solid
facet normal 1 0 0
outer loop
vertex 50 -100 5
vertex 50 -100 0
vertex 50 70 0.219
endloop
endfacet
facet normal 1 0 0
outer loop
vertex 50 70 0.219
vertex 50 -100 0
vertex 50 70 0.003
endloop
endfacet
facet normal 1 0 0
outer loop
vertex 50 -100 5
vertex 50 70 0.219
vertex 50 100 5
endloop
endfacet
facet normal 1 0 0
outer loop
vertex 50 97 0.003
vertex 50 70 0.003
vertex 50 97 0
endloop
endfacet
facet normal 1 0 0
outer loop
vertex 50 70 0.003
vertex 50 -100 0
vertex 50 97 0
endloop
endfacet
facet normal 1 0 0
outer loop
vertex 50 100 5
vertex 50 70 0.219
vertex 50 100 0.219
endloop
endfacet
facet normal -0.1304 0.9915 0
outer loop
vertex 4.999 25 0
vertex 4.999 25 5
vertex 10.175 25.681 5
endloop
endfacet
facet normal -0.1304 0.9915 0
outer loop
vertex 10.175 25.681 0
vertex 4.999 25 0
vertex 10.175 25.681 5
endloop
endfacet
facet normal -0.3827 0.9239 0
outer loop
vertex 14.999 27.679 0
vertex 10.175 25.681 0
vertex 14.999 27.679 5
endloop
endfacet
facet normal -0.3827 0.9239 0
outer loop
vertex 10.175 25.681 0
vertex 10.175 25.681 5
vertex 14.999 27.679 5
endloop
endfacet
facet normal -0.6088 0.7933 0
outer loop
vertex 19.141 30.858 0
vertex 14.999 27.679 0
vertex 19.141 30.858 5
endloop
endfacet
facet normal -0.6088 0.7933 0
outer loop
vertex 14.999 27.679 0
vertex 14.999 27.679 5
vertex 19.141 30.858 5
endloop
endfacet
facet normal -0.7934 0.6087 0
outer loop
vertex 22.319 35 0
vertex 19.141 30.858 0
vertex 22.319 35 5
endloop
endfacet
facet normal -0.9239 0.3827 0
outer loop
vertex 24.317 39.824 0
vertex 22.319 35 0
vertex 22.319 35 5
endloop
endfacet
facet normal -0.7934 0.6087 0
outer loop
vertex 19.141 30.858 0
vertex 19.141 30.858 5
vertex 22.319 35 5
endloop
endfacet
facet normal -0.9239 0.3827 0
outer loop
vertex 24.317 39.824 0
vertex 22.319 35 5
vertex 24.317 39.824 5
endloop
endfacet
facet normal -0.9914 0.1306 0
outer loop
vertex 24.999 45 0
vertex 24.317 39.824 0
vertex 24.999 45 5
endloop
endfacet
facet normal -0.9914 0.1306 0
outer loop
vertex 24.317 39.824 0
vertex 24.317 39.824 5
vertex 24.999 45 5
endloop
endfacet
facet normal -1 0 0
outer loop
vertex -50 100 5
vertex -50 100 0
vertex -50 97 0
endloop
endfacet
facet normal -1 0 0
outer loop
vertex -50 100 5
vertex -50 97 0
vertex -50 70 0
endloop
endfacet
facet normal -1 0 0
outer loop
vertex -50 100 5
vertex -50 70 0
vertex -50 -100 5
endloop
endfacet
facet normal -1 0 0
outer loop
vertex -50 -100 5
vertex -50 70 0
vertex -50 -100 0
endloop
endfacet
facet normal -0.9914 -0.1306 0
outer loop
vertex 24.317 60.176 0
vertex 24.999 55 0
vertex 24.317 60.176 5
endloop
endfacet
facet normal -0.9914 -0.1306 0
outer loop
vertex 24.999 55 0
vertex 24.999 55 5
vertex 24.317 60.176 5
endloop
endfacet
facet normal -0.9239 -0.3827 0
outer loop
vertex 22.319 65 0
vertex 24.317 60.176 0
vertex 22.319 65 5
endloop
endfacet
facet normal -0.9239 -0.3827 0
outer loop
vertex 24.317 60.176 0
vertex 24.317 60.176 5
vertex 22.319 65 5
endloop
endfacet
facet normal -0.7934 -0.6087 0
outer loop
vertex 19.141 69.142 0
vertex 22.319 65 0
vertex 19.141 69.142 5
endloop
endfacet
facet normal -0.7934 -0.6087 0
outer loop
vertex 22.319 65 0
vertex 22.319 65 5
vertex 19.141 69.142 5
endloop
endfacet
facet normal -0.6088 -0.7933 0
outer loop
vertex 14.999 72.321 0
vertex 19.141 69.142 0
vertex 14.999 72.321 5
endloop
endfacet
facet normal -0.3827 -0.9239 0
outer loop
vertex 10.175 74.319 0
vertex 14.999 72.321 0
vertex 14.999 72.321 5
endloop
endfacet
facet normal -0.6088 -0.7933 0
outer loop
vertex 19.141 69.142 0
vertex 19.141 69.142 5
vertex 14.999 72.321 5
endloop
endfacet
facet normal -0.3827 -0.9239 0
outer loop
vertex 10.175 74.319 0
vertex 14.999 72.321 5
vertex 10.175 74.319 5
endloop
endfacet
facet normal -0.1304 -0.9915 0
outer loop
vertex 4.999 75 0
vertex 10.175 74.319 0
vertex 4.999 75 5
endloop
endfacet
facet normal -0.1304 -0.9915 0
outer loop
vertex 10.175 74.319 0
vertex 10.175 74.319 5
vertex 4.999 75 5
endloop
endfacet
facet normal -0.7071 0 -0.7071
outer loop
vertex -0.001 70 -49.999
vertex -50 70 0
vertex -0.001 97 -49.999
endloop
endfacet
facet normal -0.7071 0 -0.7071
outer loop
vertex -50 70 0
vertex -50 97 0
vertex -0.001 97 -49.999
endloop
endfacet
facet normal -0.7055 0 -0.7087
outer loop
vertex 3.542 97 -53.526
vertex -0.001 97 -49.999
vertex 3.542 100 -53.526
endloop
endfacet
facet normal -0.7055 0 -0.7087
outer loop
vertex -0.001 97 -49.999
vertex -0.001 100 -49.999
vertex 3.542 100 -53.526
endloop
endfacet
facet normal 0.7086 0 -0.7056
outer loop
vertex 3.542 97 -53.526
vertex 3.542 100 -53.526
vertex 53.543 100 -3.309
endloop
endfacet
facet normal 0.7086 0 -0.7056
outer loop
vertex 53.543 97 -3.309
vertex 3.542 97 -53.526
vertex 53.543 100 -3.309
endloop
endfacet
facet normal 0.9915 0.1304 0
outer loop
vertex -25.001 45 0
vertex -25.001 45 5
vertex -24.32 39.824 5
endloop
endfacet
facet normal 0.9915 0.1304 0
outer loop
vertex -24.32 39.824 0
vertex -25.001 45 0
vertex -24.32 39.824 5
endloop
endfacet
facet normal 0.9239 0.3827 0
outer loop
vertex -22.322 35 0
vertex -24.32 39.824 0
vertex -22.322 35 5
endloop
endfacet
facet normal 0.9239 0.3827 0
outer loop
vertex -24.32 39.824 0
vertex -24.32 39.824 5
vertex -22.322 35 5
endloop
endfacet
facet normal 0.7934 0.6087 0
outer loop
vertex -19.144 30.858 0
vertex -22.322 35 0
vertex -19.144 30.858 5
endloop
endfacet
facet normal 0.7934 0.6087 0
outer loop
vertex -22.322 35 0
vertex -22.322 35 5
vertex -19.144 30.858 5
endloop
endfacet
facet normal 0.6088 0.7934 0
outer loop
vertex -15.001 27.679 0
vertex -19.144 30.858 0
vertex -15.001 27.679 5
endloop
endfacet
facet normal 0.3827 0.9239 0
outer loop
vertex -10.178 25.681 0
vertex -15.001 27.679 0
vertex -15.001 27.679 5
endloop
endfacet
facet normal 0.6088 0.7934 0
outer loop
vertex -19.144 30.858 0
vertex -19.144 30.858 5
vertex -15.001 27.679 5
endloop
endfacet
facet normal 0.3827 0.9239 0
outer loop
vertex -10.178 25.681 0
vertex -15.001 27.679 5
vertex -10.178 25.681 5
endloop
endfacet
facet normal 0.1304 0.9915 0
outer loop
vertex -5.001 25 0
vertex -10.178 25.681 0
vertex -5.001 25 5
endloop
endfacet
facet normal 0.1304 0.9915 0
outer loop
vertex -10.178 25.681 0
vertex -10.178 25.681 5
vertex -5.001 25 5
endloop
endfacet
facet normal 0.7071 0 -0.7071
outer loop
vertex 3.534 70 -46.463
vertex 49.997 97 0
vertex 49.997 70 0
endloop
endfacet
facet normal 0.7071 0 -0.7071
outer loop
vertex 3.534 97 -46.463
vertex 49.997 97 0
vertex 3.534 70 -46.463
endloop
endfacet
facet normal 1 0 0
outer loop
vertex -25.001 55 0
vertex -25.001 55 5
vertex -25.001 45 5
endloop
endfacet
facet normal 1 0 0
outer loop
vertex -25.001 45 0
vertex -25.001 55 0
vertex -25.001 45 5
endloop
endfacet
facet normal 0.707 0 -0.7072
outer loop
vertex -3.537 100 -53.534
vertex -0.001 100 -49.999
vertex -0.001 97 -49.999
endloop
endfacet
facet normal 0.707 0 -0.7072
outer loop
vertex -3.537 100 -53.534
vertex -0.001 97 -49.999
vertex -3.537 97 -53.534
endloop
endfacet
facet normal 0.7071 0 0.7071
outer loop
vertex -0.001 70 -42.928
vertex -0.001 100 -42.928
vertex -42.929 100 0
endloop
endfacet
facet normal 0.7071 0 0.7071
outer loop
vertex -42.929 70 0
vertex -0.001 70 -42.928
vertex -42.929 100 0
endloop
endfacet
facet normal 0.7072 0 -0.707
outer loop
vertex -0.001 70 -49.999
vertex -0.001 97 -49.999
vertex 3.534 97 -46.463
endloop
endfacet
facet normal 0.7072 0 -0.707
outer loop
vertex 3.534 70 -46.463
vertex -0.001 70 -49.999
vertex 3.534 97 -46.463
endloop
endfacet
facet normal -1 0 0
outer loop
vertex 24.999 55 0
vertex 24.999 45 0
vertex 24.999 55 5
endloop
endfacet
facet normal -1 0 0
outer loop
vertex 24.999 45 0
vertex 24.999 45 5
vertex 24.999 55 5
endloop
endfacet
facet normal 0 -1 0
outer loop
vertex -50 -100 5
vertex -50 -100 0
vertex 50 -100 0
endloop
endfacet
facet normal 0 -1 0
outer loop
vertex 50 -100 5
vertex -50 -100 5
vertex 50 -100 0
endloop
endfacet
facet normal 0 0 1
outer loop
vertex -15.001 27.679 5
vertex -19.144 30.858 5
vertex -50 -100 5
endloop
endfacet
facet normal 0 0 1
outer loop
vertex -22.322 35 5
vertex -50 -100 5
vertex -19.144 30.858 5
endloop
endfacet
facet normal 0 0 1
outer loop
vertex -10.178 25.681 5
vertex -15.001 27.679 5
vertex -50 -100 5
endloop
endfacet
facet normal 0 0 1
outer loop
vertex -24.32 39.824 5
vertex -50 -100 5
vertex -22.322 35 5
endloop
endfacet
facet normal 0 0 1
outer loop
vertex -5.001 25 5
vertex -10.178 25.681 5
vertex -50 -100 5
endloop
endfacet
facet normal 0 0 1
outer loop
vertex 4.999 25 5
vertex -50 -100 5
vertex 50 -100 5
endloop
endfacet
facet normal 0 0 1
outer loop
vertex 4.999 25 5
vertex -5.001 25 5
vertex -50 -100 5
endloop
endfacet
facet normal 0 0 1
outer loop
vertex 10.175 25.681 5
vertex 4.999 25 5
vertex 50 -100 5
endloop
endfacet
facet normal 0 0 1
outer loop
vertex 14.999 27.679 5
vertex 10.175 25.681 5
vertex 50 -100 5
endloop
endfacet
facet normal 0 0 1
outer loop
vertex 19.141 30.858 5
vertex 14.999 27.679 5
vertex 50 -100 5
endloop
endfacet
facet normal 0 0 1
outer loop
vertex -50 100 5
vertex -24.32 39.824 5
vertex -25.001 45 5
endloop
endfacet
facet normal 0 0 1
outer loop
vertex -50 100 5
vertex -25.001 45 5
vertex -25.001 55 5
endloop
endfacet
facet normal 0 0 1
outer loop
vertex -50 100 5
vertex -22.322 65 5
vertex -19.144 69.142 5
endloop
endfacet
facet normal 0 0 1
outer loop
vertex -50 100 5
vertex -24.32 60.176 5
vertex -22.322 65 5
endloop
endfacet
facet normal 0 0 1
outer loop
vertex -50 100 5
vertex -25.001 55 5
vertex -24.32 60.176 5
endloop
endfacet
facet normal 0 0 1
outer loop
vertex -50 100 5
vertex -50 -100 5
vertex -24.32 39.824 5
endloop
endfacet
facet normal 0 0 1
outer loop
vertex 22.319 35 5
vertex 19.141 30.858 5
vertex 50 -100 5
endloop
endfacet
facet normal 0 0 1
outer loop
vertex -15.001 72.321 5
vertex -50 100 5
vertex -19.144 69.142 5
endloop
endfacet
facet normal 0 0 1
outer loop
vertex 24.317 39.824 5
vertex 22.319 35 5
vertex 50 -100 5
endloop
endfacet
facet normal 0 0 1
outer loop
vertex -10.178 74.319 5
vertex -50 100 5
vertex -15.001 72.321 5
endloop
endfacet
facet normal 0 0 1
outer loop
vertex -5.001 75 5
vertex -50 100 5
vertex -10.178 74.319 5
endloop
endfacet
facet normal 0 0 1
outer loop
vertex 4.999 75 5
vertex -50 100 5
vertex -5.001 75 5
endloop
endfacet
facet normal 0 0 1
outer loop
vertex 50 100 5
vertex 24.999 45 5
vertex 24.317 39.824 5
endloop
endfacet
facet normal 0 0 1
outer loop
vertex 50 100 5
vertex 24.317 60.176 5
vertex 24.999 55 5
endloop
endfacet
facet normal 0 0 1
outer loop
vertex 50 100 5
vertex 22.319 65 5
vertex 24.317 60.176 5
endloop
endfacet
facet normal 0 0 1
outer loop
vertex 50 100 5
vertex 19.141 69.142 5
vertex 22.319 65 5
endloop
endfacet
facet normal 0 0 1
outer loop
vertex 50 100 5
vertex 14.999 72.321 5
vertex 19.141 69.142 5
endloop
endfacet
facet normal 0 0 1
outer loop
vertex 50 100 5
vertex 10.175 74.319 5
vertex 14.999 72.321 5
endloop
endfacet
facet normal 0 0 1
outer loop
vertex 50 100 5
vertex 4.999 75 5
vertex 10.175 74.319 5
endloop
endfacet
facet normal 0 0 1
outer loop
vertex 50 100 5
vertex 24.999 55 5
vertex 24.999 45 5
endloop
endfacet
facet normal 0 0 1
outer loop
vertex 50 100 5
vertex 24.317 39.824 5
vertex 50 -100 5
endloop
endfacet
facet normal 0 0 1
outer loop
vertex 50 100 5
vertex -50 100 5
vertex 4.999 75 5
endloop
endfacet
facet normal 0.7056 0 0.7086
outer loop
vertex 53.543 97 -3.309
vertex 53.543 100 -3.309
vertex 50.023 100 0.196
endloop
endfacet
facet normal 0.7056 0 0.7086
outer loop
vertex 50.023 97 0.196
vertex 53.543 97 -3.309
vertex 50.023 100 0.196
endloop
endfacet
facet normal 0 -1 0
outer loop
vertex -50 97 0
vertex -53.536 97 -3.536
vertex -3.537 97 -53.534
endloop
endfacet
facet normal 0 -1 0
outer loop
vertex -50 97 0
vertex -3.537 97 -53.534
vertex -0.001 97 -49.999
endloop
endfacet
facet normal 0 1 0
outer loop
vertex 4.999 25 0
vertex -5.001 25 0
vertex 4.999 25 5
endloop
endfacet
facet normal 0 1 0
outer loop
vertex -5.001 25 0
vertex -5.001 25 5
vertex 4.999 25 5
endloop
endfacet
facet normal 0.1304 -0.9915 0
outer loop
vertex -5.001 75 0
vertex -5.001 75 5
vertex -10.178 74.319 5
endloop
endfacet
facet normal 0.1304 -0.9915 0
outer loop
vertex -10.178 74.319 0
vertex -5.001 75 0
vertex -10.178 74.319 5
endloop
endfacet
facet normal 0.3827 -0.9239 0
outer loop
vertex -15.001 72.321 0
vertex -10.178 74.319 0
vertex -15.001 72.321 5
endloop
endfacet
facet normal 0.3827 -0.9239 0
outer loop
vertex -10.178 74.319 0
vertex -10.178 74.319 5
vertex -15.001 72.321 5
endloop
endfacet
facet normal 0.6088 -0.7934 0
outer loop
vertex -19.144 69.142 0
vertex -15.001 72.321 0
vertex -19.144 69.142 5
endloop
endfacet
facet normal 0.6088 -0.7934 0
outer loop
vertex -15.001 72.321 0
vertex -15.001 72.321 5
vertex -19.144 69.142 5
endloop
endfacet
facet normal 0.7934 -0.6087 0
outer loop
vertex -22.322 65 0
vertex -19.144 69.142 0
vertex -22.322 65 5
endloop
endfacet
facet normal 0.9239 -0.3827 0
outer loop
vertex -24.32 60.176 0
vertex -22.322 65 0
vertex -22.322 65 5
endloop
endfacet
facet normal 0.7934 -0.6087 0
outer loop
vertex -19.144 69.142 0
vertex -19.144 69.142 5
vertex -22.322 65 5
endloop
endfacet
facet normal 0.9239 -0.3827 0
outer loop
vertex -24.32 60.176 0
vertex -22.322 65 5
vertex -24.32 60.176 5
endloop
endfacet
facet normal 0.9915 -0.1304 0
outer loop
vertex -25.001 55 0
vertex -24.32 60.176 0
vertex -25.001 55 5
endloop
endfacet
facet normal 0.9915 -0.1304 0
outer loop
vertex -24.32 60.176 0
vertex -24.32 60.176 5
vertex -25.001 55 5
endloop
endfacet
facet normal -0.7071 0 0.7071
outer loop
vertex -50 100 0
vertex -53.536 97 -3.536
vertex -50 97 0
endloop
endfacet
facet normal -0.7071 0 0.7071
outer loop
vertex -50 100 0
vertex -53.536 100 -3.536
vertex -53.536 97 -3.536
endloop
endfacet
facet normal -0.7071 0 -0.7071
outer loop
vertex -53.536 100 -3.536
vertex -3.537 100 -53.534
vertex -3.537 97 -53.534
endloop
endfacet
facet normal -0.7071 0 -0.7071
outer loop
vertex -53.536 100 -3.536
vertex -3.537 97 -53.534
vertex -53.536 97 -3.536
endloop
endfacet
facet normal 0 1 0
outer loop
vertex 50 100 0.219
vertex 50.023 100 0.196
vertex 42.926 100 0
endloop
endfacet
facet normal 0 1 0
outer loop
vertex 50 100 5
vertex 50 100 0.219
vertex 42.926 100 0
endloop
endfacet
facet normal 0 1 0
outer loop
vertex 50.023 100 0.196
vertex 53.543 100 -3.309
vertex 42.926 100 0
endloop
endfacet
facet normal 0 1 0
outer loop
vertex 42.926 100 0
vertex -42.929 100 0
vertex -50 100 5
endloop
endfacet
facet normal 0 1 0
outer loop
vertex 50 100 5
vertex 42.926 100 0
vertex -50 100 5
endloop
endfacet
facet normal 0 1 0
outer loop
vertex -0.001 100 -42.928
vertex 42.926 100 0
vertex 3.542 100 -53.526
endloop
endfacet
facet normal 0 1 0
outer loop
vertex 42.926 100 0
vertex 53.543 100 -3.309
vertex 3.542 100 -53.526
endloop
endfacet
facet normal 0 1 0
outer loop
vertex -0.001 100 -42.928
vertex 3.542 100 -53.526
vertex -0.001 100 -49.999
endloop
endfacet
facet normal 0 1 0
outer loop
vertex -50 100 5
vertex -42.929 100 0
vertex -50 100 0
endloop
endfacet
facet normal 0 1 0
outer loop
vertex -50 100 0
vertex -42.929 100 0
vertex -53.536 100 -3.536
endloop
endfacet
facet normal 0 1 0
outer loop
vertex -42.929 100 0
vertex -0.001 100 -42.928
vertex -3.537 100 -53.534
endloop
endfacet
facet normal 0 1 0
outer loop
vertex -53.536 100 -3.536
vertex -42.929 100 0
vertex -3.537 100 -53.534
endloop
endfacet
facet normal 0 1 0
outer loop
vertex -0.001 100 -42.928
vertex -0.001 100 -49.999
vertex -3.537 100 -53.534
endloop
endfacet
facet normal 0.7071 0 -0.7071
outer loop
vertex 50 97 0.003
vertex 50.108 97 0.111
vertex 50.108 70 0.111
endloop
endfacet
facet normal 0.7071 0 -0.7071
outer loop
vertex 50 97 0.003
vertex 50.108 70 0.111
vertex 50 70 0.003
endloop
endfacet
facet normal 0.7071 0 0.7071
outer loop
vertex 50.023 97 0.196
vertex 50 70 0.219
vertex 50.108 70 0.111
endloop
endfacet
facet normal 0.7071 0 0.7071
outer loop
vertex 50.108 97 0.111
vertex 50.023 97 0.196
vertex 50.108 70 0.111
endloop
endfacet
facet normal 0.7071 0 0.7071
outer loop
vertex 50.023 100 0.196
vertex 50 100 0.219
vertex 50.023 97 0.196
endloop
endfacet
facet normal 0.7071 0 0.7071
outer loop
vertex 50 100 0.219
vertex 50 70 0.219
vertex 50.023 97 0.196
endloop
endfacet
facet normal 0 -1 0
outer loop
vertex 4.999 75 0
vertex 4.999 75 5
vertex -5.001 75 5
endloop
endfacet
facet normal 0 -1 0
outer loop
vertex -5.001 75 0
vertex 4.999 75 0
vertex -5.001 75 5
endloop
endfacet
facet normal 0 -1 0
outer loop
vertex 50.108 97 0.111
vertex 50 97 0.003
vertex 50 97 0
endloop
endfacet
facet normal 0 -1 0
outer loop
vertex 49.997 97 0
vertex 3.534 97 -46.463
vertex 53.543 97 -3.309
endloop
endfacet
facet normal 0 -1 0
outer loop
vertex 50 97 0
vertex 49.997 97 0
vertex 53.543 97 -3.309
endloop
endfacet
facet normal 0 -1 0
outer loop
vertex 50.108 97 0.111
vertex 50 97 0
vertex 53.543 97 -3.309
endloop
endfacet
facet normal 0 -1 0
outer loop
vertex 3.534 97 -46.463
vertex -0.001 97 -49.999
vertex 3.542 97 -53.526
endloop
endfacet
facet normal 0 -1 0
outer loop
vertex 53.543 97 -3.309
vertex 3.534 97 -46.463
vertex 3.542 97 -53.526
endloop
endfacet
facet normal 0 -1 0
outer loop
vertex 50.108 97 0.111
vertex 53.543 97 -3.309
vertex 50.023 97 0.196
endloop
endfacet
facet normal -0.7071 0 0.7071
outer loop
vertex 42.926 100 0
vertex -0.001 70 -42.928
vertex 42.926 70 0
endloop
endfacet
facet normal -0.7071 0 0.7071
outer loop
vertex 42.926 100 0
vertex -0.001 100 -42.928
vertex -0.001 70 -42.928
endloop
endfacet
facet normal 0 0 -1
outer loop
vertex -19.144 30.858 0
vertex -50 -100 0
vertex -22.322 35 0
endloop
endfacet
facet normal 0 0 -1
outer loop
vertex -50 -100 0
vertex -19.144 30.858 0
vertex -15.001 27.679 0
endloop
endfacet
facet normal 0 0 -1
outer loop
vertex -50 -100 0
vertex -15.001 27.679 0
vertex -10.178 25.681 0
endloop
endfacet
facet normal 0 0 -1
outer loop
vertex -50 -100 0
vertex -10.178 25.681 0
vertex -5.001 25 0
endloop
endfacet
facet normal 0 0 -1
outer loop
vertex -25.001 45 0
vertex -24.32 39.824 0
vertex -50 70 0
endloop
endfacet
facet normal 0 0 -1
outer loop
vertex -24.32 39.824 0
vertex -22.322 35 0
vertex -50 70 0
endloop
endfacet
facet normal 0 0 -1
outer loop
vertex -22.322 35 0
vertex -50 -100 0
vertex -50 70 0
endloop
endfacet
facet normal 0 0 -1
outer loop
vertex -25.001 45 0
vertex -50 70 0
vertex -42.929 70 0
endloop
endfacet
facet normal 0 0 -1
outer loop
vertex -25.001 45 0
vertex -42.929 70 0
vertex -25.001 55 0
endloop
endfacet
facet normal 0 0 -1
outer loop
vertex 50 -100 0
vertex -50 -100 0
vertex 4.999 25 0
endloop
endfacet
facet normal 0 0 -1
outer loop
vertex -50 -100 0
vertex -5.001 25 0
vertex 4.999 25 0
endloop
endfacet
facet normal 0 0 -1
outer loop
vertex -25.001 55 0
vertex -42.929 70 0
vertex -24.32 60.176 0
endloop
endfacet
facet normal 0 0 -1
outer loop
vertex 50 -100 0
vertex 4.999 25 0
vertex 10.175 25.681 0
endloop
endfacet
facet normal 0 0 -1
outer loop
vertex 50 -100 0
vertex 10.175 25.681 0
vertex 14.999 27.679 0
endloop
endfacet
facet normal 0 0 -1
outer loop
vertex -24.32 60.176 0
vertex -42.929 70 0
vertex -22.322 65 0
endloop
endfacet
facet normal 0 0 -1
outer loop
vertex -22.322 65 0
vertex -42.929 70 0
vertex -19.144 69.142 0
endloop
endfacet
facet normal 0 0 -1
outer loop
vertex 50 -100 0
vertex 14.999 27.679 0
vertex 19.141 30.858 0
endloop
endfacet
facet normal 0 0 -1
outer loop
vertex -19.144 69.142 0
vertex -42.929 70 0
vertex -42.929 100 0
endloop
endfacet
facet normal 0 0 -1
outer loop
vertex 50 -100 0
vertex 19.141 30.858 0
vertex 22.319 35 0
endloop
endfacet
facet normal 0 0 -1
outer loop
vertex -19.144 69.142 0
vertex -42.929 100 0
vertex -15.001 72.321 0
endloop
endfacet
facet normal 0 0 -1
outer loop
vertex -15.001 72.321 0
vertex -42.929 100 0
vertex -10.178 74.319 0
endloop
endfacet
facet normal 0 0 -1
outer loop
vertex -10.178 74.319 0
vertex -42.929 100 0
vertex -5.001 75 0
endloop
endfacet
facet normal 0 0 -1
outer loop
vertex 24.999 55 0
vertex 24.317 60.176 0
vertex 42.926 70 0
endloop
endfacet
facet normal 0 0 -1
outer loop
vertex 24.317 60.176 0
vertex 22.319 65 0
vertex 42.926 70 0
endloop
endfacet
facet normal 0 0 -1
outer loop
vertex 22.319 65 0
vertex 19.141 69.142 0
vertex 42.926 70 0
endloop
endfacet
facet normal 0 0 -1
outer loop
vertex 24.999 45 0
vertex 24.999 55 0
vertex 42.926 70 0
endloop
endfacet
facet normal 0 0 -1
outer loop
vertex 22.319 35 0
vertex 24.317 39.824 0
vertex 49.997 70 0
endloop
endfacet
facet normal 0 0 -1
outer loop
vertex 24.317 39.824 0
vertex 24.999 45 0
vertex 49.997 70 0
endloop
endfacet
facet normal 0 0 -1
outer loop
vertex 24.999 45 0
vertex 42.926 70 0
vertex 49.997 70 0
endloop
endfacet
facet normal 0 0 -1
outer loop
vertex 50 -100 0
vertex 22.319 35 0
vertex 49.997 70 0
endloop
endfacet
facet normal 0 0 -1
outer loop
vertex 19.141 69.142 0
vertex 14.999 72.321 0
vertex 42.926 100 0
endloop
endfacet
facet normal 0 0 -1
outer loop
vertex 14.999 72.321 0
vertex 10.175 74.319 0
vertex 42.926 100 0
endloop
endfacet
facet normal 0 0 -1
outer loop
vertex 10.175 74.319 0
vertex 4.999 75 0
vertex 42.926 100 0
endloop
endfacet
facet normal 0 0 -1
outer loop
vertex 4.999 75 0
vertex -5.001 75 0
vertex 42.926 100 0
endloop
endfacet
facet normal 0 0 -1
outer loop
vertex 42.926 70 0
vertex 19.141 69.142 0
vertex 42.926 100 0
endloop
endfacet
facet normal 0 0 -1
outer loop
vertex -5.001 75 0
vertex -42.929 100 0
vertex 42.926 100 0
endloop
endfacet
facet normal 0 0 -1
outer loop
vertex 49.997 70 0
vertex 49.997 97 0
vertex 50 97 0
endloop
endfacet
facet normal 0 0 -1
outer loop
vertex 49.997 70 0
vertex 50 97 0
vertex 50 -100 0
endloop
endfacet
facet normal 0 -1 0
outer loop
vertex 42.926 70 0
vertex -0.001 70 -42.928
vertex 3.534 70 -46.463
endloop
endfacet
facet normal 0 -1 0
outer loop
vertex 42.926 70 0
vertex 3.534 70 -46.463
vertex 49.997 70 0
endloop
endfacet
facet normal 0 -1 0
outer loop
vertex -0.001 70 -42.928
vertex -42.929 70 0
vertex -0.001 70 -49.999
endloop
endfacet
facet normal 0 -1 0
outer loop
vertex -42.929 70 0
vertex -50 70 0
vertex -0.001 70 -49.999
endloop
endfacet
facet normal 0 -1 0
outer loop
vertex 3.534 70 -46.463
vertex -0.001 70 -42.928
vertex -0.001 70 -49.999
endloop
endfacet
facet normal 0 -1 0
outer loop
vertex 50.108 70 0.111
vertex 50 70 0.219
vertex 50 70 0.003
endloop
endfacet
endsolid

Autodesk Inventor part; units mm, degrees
ref_plane "YZ Plane" through (0, 0, 0) normal (1, 0, 0) x (0, 1, 0)
ref_plane "XZ Plane" through (0, 0, 0) normal (0, 1, 0) x (-1, 0, 0)
ref_plane "XY Plane" through (0, 0, 0) normal (0, 0, 1) x (1, 0, 0)
sketch "Sketch1" plane through (0, 0, 0) normal (0, 0, 1) x (1, 0, 0)
  line L0 (-50, -100) -> (50, -100)
  line L1 (50, -100) -> (50, 100)
  line L2 (50, 100) -> (-50, 100)
  line L3 (-50, 100) -> (-50, -100)
  line L4 (-50, -100) -> (50, 100) construction
  line L5 (50, -100) -> (-50, 100) construction
  point P0 (0, 0)
  dimension "d0" = 100
  dimension "d1" = 200
extrude "Extrusion1" add sketch "Sketch1" along normal blind 5
sketch "Sketch2" plane through (-50, 100, 0) normal (0, 1, 0) x (1, 0, 0)
  line L0 (0, 0) -> (100, 0) projected
  line L1 (0, 0) -> (49.9986, 49.9986)
  line L2 (49.9986, 49.9986) -> (53.5341, 46.463)
  line L3 (53.5341, 46.463) -> (3.5355, -3.5355)
  line L4 (3.5355, -3.5355) -> (0, 0)
  line L5 (0, 0) -> (70.7086, 0) construction
  line L6 (100.108, -0.1109) -> (53.5341, 46.463)
  line L7 (53.5341, 46.463) -> (49.9986, 42.9275)
  line L8 (49.9986, 42.9275) -> (96.5724, -3.6464)
  line L9 (96.5724, -3.6464) -> (100.108, -0.1109)
  point P0 (50, 0)
  point P1 (49.9986, 42.9275)
  dimension "d4" = 45
  dimension "d5" = 5
  dimension "d6" = 5
extrude "Extrusion2" add sketch "Sketch2" against normal blind 30 contours L1 L2 L3 L0 | L0 L3 L4 | L8 L3 L6 L0 | L0 L6 L9 L8
sketch "Sketch6" plane through (0, 0, 5) normal (0, 0, 1) x (1, 0, 0)
  line L0 (4.9986, 75) -> (-5.0014, 75)
  line L1 (-25.0014, 55) -> (-25.0014, 45)
  line L2 (-5.0014, 25) -> (4.9986, 25)
  line L3 (24.9986, 45) -> (24.9986, 55)
  line L4 (24.9986, 75) -> (-25.0014, 25) construction
  line L5 (-25.0014, 75) -> (24.9986, 25) construction
  arc A0 (4.9986, 25) -> (24.9986, 45) centre (4.9986, 45) ccw
  arc A1 (24.9986, 55) -> (4.9986, 75) centre (4.9986, 55) ccw
  arc A2 (-5.0014, 75) -> (-25.0014, 55) centre (-5.0014, 55) ccw
  arc A3 (-25.0014, 45) -> (-5.0014, 25) centre (-5.0014, 45) ccw
  point P0 (0, 0)
  point P1 (-0.0014, 50)
  dimension "d21" = 50
  dimension "d22" = 50
  dimension "d23" = 20
extrude "Extrusion6" cut sketch "Sketch6" against normal blind 5
sketch "Sketch10" plane through (-50, 100, 5) normal (0, 1, 0) x (1, 0, 0)
  line L0 (0, 5) -> (7.0711, 5) projected
  line L1 (49.9986, 54.9986) -> (99.9971, 5) projected
  line L2 (0, 5) -> (49.9986, 54.9986)
  line L3 (49.9986, 54.9986) -> (46.463, 58.5341)
  line L4 (46.463, 58.5341) -> (-3.5355, 8.5355)
  line L5 (-3.5355, 8.5355) -> (0, 5)
  line L6 (100, 4.7812) -> (100, 0) projected
  line L7 (100, 4.7812) -> (49.9986, 54.9986)
  line L8 (49.9986, 54.9986) -> (53.5417, 58.5265)
  line L9 (53.5417, 58.5265) -> (103.5431, 8.3091)
  line L10 (103.5431, 8.3091) -> (100, 4.7812)
  line L11 (92.926, 5) -> (49.9986, 47.9275) projected
  line L12 (100, 0) -> (0, 0) projected
  line L13 (0, 0) -> (100, 0)
  point P0 (50, 5)
  dimension "d33" = 5
  dimension "d34" = 5
extrude "Extrusion9" add sketch "Sketch10" against normal blind 3
properties part number "fixation_v09"
